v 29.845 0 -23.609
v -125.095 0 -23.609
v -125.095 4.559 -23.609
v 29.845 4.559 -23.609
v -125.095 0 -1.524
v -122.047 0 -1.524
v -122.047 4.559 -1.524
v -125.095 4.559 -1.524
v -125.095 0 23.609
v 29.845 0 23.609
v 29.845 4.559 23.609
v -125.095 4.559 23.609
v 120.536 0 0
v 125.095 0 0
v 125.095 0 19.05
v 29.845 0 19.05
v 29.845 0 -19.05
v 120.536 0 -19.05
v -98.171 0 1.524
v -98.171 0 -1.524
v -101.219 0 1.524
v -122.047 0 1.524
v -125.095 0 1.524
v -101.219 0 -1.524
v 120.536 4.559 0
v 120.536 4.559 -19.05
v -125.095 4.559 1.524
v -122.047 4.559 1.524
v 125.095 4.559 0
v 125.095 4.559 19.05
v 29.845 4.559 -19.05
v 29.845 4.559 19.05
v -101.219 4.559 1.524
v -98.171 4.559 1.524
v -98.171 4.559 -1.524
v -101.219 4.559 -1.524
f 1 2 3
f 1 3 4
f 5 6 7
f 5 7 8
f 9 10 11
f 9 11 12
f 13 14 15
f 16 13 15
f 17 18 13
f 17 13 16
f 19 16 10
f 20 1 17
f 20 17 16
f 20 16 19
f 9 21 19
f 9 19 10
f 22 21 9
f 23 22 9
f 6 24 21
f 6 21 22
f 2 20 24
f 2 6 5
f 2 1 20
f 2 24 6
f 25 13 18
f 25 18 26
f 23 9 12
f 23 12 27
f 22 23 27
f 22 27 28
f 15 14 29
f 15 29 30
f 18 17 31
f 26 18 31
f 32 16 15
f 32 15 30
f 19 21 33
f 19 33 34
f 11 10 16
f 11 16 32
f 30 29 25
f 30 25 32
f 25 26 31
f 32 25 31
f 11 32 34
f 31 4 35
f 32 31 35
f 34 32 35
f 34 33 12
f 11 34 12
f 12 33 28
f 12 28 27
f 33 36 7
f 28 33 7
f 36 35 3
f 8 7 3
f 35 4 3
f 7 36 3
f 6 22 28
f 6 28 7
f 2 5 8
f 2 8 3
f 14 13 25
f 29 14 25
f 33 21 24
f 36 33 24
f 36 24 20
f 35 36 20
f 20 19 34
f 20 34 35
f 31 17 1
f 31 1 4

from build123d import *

# Parameters (mm, degrees)
SKETCH1_W           = 3.048
SKETCH1_H           = 3.048
BOSS_EXTRUDE1_DEPTH = 4.5593
CAVITY1_START       = 29.845
CAVITY1_OUTLINE_W   = 4.5593
CAVITY1_OUTLINE_H   = 4.5593
CAVITY1_DEPTH       = 95.25
CAVITY1_START_2     = 120.5357
CAVITY1_2_OUTLINE_W = 4.5593
CAVITY1_2_OUTLINE_H = 19.05
CAVITY1_2_DEPTH     = 4.5593


# Read off the part's stored shape, not the designer's step: Cavity1
with BuildPart() as part:
    # Sketch1 → Boss-Extrude1 (new body)
    with BuildSketch(Plane(origin=(0, 0, 0), x_dir=(1, 0, 0), z_dir=(0, 1, 0))):
        Polygon((125.095, -23.6093), (-125.095, -23.6093), (-125.095, -1.524), (-122.047, -1.524), (-122.047, 1.524), (-125.095, 1.524), (-125.095, 23.6093), (125.095, 23.6093), align=None)
        with Locations((-99.695, 0)):
            Rectangle(SKETCH1_W, SKETCH1_H, mode=Mode.SUBTRACT)
    extrude(amount=BOSS_EXTRUDE1_DEPTH)

    # Cavity1 outline → Cavity1 (cut)
    with BuildSketch(Plane.YZ.offset(CAVITY1_START)):
        with Locations((2.27965, 21.32965)):
            Rectangle(CAVITY1_OUTLINE_W, CAVITY1_OUTLINE_H)
        with Locations((2.27965, -21.32965)):
            Rectangle(CAVITY1_OUTLINE_W, CAVITY1_OUTLINE_H)
    extrude(amount=CAVITY1_DEPTH, mode=Mode.SUBTRACT)

    # Cavity1 2 outline → Cavity1 2 (cut)
    with BuildSketch(Plane.YZ.offset(CAVITY1_START_2)):
        with Locations((2.27965, -9.525)):
            Rectangle(CAVITY1_2_OUTLINE_W, CAVITY1_2_OUTLINE_H)
    extrude(amount=CAVITY1_2_DEPTH, mode=Mode.SUBTRACT)


solid = part.part
